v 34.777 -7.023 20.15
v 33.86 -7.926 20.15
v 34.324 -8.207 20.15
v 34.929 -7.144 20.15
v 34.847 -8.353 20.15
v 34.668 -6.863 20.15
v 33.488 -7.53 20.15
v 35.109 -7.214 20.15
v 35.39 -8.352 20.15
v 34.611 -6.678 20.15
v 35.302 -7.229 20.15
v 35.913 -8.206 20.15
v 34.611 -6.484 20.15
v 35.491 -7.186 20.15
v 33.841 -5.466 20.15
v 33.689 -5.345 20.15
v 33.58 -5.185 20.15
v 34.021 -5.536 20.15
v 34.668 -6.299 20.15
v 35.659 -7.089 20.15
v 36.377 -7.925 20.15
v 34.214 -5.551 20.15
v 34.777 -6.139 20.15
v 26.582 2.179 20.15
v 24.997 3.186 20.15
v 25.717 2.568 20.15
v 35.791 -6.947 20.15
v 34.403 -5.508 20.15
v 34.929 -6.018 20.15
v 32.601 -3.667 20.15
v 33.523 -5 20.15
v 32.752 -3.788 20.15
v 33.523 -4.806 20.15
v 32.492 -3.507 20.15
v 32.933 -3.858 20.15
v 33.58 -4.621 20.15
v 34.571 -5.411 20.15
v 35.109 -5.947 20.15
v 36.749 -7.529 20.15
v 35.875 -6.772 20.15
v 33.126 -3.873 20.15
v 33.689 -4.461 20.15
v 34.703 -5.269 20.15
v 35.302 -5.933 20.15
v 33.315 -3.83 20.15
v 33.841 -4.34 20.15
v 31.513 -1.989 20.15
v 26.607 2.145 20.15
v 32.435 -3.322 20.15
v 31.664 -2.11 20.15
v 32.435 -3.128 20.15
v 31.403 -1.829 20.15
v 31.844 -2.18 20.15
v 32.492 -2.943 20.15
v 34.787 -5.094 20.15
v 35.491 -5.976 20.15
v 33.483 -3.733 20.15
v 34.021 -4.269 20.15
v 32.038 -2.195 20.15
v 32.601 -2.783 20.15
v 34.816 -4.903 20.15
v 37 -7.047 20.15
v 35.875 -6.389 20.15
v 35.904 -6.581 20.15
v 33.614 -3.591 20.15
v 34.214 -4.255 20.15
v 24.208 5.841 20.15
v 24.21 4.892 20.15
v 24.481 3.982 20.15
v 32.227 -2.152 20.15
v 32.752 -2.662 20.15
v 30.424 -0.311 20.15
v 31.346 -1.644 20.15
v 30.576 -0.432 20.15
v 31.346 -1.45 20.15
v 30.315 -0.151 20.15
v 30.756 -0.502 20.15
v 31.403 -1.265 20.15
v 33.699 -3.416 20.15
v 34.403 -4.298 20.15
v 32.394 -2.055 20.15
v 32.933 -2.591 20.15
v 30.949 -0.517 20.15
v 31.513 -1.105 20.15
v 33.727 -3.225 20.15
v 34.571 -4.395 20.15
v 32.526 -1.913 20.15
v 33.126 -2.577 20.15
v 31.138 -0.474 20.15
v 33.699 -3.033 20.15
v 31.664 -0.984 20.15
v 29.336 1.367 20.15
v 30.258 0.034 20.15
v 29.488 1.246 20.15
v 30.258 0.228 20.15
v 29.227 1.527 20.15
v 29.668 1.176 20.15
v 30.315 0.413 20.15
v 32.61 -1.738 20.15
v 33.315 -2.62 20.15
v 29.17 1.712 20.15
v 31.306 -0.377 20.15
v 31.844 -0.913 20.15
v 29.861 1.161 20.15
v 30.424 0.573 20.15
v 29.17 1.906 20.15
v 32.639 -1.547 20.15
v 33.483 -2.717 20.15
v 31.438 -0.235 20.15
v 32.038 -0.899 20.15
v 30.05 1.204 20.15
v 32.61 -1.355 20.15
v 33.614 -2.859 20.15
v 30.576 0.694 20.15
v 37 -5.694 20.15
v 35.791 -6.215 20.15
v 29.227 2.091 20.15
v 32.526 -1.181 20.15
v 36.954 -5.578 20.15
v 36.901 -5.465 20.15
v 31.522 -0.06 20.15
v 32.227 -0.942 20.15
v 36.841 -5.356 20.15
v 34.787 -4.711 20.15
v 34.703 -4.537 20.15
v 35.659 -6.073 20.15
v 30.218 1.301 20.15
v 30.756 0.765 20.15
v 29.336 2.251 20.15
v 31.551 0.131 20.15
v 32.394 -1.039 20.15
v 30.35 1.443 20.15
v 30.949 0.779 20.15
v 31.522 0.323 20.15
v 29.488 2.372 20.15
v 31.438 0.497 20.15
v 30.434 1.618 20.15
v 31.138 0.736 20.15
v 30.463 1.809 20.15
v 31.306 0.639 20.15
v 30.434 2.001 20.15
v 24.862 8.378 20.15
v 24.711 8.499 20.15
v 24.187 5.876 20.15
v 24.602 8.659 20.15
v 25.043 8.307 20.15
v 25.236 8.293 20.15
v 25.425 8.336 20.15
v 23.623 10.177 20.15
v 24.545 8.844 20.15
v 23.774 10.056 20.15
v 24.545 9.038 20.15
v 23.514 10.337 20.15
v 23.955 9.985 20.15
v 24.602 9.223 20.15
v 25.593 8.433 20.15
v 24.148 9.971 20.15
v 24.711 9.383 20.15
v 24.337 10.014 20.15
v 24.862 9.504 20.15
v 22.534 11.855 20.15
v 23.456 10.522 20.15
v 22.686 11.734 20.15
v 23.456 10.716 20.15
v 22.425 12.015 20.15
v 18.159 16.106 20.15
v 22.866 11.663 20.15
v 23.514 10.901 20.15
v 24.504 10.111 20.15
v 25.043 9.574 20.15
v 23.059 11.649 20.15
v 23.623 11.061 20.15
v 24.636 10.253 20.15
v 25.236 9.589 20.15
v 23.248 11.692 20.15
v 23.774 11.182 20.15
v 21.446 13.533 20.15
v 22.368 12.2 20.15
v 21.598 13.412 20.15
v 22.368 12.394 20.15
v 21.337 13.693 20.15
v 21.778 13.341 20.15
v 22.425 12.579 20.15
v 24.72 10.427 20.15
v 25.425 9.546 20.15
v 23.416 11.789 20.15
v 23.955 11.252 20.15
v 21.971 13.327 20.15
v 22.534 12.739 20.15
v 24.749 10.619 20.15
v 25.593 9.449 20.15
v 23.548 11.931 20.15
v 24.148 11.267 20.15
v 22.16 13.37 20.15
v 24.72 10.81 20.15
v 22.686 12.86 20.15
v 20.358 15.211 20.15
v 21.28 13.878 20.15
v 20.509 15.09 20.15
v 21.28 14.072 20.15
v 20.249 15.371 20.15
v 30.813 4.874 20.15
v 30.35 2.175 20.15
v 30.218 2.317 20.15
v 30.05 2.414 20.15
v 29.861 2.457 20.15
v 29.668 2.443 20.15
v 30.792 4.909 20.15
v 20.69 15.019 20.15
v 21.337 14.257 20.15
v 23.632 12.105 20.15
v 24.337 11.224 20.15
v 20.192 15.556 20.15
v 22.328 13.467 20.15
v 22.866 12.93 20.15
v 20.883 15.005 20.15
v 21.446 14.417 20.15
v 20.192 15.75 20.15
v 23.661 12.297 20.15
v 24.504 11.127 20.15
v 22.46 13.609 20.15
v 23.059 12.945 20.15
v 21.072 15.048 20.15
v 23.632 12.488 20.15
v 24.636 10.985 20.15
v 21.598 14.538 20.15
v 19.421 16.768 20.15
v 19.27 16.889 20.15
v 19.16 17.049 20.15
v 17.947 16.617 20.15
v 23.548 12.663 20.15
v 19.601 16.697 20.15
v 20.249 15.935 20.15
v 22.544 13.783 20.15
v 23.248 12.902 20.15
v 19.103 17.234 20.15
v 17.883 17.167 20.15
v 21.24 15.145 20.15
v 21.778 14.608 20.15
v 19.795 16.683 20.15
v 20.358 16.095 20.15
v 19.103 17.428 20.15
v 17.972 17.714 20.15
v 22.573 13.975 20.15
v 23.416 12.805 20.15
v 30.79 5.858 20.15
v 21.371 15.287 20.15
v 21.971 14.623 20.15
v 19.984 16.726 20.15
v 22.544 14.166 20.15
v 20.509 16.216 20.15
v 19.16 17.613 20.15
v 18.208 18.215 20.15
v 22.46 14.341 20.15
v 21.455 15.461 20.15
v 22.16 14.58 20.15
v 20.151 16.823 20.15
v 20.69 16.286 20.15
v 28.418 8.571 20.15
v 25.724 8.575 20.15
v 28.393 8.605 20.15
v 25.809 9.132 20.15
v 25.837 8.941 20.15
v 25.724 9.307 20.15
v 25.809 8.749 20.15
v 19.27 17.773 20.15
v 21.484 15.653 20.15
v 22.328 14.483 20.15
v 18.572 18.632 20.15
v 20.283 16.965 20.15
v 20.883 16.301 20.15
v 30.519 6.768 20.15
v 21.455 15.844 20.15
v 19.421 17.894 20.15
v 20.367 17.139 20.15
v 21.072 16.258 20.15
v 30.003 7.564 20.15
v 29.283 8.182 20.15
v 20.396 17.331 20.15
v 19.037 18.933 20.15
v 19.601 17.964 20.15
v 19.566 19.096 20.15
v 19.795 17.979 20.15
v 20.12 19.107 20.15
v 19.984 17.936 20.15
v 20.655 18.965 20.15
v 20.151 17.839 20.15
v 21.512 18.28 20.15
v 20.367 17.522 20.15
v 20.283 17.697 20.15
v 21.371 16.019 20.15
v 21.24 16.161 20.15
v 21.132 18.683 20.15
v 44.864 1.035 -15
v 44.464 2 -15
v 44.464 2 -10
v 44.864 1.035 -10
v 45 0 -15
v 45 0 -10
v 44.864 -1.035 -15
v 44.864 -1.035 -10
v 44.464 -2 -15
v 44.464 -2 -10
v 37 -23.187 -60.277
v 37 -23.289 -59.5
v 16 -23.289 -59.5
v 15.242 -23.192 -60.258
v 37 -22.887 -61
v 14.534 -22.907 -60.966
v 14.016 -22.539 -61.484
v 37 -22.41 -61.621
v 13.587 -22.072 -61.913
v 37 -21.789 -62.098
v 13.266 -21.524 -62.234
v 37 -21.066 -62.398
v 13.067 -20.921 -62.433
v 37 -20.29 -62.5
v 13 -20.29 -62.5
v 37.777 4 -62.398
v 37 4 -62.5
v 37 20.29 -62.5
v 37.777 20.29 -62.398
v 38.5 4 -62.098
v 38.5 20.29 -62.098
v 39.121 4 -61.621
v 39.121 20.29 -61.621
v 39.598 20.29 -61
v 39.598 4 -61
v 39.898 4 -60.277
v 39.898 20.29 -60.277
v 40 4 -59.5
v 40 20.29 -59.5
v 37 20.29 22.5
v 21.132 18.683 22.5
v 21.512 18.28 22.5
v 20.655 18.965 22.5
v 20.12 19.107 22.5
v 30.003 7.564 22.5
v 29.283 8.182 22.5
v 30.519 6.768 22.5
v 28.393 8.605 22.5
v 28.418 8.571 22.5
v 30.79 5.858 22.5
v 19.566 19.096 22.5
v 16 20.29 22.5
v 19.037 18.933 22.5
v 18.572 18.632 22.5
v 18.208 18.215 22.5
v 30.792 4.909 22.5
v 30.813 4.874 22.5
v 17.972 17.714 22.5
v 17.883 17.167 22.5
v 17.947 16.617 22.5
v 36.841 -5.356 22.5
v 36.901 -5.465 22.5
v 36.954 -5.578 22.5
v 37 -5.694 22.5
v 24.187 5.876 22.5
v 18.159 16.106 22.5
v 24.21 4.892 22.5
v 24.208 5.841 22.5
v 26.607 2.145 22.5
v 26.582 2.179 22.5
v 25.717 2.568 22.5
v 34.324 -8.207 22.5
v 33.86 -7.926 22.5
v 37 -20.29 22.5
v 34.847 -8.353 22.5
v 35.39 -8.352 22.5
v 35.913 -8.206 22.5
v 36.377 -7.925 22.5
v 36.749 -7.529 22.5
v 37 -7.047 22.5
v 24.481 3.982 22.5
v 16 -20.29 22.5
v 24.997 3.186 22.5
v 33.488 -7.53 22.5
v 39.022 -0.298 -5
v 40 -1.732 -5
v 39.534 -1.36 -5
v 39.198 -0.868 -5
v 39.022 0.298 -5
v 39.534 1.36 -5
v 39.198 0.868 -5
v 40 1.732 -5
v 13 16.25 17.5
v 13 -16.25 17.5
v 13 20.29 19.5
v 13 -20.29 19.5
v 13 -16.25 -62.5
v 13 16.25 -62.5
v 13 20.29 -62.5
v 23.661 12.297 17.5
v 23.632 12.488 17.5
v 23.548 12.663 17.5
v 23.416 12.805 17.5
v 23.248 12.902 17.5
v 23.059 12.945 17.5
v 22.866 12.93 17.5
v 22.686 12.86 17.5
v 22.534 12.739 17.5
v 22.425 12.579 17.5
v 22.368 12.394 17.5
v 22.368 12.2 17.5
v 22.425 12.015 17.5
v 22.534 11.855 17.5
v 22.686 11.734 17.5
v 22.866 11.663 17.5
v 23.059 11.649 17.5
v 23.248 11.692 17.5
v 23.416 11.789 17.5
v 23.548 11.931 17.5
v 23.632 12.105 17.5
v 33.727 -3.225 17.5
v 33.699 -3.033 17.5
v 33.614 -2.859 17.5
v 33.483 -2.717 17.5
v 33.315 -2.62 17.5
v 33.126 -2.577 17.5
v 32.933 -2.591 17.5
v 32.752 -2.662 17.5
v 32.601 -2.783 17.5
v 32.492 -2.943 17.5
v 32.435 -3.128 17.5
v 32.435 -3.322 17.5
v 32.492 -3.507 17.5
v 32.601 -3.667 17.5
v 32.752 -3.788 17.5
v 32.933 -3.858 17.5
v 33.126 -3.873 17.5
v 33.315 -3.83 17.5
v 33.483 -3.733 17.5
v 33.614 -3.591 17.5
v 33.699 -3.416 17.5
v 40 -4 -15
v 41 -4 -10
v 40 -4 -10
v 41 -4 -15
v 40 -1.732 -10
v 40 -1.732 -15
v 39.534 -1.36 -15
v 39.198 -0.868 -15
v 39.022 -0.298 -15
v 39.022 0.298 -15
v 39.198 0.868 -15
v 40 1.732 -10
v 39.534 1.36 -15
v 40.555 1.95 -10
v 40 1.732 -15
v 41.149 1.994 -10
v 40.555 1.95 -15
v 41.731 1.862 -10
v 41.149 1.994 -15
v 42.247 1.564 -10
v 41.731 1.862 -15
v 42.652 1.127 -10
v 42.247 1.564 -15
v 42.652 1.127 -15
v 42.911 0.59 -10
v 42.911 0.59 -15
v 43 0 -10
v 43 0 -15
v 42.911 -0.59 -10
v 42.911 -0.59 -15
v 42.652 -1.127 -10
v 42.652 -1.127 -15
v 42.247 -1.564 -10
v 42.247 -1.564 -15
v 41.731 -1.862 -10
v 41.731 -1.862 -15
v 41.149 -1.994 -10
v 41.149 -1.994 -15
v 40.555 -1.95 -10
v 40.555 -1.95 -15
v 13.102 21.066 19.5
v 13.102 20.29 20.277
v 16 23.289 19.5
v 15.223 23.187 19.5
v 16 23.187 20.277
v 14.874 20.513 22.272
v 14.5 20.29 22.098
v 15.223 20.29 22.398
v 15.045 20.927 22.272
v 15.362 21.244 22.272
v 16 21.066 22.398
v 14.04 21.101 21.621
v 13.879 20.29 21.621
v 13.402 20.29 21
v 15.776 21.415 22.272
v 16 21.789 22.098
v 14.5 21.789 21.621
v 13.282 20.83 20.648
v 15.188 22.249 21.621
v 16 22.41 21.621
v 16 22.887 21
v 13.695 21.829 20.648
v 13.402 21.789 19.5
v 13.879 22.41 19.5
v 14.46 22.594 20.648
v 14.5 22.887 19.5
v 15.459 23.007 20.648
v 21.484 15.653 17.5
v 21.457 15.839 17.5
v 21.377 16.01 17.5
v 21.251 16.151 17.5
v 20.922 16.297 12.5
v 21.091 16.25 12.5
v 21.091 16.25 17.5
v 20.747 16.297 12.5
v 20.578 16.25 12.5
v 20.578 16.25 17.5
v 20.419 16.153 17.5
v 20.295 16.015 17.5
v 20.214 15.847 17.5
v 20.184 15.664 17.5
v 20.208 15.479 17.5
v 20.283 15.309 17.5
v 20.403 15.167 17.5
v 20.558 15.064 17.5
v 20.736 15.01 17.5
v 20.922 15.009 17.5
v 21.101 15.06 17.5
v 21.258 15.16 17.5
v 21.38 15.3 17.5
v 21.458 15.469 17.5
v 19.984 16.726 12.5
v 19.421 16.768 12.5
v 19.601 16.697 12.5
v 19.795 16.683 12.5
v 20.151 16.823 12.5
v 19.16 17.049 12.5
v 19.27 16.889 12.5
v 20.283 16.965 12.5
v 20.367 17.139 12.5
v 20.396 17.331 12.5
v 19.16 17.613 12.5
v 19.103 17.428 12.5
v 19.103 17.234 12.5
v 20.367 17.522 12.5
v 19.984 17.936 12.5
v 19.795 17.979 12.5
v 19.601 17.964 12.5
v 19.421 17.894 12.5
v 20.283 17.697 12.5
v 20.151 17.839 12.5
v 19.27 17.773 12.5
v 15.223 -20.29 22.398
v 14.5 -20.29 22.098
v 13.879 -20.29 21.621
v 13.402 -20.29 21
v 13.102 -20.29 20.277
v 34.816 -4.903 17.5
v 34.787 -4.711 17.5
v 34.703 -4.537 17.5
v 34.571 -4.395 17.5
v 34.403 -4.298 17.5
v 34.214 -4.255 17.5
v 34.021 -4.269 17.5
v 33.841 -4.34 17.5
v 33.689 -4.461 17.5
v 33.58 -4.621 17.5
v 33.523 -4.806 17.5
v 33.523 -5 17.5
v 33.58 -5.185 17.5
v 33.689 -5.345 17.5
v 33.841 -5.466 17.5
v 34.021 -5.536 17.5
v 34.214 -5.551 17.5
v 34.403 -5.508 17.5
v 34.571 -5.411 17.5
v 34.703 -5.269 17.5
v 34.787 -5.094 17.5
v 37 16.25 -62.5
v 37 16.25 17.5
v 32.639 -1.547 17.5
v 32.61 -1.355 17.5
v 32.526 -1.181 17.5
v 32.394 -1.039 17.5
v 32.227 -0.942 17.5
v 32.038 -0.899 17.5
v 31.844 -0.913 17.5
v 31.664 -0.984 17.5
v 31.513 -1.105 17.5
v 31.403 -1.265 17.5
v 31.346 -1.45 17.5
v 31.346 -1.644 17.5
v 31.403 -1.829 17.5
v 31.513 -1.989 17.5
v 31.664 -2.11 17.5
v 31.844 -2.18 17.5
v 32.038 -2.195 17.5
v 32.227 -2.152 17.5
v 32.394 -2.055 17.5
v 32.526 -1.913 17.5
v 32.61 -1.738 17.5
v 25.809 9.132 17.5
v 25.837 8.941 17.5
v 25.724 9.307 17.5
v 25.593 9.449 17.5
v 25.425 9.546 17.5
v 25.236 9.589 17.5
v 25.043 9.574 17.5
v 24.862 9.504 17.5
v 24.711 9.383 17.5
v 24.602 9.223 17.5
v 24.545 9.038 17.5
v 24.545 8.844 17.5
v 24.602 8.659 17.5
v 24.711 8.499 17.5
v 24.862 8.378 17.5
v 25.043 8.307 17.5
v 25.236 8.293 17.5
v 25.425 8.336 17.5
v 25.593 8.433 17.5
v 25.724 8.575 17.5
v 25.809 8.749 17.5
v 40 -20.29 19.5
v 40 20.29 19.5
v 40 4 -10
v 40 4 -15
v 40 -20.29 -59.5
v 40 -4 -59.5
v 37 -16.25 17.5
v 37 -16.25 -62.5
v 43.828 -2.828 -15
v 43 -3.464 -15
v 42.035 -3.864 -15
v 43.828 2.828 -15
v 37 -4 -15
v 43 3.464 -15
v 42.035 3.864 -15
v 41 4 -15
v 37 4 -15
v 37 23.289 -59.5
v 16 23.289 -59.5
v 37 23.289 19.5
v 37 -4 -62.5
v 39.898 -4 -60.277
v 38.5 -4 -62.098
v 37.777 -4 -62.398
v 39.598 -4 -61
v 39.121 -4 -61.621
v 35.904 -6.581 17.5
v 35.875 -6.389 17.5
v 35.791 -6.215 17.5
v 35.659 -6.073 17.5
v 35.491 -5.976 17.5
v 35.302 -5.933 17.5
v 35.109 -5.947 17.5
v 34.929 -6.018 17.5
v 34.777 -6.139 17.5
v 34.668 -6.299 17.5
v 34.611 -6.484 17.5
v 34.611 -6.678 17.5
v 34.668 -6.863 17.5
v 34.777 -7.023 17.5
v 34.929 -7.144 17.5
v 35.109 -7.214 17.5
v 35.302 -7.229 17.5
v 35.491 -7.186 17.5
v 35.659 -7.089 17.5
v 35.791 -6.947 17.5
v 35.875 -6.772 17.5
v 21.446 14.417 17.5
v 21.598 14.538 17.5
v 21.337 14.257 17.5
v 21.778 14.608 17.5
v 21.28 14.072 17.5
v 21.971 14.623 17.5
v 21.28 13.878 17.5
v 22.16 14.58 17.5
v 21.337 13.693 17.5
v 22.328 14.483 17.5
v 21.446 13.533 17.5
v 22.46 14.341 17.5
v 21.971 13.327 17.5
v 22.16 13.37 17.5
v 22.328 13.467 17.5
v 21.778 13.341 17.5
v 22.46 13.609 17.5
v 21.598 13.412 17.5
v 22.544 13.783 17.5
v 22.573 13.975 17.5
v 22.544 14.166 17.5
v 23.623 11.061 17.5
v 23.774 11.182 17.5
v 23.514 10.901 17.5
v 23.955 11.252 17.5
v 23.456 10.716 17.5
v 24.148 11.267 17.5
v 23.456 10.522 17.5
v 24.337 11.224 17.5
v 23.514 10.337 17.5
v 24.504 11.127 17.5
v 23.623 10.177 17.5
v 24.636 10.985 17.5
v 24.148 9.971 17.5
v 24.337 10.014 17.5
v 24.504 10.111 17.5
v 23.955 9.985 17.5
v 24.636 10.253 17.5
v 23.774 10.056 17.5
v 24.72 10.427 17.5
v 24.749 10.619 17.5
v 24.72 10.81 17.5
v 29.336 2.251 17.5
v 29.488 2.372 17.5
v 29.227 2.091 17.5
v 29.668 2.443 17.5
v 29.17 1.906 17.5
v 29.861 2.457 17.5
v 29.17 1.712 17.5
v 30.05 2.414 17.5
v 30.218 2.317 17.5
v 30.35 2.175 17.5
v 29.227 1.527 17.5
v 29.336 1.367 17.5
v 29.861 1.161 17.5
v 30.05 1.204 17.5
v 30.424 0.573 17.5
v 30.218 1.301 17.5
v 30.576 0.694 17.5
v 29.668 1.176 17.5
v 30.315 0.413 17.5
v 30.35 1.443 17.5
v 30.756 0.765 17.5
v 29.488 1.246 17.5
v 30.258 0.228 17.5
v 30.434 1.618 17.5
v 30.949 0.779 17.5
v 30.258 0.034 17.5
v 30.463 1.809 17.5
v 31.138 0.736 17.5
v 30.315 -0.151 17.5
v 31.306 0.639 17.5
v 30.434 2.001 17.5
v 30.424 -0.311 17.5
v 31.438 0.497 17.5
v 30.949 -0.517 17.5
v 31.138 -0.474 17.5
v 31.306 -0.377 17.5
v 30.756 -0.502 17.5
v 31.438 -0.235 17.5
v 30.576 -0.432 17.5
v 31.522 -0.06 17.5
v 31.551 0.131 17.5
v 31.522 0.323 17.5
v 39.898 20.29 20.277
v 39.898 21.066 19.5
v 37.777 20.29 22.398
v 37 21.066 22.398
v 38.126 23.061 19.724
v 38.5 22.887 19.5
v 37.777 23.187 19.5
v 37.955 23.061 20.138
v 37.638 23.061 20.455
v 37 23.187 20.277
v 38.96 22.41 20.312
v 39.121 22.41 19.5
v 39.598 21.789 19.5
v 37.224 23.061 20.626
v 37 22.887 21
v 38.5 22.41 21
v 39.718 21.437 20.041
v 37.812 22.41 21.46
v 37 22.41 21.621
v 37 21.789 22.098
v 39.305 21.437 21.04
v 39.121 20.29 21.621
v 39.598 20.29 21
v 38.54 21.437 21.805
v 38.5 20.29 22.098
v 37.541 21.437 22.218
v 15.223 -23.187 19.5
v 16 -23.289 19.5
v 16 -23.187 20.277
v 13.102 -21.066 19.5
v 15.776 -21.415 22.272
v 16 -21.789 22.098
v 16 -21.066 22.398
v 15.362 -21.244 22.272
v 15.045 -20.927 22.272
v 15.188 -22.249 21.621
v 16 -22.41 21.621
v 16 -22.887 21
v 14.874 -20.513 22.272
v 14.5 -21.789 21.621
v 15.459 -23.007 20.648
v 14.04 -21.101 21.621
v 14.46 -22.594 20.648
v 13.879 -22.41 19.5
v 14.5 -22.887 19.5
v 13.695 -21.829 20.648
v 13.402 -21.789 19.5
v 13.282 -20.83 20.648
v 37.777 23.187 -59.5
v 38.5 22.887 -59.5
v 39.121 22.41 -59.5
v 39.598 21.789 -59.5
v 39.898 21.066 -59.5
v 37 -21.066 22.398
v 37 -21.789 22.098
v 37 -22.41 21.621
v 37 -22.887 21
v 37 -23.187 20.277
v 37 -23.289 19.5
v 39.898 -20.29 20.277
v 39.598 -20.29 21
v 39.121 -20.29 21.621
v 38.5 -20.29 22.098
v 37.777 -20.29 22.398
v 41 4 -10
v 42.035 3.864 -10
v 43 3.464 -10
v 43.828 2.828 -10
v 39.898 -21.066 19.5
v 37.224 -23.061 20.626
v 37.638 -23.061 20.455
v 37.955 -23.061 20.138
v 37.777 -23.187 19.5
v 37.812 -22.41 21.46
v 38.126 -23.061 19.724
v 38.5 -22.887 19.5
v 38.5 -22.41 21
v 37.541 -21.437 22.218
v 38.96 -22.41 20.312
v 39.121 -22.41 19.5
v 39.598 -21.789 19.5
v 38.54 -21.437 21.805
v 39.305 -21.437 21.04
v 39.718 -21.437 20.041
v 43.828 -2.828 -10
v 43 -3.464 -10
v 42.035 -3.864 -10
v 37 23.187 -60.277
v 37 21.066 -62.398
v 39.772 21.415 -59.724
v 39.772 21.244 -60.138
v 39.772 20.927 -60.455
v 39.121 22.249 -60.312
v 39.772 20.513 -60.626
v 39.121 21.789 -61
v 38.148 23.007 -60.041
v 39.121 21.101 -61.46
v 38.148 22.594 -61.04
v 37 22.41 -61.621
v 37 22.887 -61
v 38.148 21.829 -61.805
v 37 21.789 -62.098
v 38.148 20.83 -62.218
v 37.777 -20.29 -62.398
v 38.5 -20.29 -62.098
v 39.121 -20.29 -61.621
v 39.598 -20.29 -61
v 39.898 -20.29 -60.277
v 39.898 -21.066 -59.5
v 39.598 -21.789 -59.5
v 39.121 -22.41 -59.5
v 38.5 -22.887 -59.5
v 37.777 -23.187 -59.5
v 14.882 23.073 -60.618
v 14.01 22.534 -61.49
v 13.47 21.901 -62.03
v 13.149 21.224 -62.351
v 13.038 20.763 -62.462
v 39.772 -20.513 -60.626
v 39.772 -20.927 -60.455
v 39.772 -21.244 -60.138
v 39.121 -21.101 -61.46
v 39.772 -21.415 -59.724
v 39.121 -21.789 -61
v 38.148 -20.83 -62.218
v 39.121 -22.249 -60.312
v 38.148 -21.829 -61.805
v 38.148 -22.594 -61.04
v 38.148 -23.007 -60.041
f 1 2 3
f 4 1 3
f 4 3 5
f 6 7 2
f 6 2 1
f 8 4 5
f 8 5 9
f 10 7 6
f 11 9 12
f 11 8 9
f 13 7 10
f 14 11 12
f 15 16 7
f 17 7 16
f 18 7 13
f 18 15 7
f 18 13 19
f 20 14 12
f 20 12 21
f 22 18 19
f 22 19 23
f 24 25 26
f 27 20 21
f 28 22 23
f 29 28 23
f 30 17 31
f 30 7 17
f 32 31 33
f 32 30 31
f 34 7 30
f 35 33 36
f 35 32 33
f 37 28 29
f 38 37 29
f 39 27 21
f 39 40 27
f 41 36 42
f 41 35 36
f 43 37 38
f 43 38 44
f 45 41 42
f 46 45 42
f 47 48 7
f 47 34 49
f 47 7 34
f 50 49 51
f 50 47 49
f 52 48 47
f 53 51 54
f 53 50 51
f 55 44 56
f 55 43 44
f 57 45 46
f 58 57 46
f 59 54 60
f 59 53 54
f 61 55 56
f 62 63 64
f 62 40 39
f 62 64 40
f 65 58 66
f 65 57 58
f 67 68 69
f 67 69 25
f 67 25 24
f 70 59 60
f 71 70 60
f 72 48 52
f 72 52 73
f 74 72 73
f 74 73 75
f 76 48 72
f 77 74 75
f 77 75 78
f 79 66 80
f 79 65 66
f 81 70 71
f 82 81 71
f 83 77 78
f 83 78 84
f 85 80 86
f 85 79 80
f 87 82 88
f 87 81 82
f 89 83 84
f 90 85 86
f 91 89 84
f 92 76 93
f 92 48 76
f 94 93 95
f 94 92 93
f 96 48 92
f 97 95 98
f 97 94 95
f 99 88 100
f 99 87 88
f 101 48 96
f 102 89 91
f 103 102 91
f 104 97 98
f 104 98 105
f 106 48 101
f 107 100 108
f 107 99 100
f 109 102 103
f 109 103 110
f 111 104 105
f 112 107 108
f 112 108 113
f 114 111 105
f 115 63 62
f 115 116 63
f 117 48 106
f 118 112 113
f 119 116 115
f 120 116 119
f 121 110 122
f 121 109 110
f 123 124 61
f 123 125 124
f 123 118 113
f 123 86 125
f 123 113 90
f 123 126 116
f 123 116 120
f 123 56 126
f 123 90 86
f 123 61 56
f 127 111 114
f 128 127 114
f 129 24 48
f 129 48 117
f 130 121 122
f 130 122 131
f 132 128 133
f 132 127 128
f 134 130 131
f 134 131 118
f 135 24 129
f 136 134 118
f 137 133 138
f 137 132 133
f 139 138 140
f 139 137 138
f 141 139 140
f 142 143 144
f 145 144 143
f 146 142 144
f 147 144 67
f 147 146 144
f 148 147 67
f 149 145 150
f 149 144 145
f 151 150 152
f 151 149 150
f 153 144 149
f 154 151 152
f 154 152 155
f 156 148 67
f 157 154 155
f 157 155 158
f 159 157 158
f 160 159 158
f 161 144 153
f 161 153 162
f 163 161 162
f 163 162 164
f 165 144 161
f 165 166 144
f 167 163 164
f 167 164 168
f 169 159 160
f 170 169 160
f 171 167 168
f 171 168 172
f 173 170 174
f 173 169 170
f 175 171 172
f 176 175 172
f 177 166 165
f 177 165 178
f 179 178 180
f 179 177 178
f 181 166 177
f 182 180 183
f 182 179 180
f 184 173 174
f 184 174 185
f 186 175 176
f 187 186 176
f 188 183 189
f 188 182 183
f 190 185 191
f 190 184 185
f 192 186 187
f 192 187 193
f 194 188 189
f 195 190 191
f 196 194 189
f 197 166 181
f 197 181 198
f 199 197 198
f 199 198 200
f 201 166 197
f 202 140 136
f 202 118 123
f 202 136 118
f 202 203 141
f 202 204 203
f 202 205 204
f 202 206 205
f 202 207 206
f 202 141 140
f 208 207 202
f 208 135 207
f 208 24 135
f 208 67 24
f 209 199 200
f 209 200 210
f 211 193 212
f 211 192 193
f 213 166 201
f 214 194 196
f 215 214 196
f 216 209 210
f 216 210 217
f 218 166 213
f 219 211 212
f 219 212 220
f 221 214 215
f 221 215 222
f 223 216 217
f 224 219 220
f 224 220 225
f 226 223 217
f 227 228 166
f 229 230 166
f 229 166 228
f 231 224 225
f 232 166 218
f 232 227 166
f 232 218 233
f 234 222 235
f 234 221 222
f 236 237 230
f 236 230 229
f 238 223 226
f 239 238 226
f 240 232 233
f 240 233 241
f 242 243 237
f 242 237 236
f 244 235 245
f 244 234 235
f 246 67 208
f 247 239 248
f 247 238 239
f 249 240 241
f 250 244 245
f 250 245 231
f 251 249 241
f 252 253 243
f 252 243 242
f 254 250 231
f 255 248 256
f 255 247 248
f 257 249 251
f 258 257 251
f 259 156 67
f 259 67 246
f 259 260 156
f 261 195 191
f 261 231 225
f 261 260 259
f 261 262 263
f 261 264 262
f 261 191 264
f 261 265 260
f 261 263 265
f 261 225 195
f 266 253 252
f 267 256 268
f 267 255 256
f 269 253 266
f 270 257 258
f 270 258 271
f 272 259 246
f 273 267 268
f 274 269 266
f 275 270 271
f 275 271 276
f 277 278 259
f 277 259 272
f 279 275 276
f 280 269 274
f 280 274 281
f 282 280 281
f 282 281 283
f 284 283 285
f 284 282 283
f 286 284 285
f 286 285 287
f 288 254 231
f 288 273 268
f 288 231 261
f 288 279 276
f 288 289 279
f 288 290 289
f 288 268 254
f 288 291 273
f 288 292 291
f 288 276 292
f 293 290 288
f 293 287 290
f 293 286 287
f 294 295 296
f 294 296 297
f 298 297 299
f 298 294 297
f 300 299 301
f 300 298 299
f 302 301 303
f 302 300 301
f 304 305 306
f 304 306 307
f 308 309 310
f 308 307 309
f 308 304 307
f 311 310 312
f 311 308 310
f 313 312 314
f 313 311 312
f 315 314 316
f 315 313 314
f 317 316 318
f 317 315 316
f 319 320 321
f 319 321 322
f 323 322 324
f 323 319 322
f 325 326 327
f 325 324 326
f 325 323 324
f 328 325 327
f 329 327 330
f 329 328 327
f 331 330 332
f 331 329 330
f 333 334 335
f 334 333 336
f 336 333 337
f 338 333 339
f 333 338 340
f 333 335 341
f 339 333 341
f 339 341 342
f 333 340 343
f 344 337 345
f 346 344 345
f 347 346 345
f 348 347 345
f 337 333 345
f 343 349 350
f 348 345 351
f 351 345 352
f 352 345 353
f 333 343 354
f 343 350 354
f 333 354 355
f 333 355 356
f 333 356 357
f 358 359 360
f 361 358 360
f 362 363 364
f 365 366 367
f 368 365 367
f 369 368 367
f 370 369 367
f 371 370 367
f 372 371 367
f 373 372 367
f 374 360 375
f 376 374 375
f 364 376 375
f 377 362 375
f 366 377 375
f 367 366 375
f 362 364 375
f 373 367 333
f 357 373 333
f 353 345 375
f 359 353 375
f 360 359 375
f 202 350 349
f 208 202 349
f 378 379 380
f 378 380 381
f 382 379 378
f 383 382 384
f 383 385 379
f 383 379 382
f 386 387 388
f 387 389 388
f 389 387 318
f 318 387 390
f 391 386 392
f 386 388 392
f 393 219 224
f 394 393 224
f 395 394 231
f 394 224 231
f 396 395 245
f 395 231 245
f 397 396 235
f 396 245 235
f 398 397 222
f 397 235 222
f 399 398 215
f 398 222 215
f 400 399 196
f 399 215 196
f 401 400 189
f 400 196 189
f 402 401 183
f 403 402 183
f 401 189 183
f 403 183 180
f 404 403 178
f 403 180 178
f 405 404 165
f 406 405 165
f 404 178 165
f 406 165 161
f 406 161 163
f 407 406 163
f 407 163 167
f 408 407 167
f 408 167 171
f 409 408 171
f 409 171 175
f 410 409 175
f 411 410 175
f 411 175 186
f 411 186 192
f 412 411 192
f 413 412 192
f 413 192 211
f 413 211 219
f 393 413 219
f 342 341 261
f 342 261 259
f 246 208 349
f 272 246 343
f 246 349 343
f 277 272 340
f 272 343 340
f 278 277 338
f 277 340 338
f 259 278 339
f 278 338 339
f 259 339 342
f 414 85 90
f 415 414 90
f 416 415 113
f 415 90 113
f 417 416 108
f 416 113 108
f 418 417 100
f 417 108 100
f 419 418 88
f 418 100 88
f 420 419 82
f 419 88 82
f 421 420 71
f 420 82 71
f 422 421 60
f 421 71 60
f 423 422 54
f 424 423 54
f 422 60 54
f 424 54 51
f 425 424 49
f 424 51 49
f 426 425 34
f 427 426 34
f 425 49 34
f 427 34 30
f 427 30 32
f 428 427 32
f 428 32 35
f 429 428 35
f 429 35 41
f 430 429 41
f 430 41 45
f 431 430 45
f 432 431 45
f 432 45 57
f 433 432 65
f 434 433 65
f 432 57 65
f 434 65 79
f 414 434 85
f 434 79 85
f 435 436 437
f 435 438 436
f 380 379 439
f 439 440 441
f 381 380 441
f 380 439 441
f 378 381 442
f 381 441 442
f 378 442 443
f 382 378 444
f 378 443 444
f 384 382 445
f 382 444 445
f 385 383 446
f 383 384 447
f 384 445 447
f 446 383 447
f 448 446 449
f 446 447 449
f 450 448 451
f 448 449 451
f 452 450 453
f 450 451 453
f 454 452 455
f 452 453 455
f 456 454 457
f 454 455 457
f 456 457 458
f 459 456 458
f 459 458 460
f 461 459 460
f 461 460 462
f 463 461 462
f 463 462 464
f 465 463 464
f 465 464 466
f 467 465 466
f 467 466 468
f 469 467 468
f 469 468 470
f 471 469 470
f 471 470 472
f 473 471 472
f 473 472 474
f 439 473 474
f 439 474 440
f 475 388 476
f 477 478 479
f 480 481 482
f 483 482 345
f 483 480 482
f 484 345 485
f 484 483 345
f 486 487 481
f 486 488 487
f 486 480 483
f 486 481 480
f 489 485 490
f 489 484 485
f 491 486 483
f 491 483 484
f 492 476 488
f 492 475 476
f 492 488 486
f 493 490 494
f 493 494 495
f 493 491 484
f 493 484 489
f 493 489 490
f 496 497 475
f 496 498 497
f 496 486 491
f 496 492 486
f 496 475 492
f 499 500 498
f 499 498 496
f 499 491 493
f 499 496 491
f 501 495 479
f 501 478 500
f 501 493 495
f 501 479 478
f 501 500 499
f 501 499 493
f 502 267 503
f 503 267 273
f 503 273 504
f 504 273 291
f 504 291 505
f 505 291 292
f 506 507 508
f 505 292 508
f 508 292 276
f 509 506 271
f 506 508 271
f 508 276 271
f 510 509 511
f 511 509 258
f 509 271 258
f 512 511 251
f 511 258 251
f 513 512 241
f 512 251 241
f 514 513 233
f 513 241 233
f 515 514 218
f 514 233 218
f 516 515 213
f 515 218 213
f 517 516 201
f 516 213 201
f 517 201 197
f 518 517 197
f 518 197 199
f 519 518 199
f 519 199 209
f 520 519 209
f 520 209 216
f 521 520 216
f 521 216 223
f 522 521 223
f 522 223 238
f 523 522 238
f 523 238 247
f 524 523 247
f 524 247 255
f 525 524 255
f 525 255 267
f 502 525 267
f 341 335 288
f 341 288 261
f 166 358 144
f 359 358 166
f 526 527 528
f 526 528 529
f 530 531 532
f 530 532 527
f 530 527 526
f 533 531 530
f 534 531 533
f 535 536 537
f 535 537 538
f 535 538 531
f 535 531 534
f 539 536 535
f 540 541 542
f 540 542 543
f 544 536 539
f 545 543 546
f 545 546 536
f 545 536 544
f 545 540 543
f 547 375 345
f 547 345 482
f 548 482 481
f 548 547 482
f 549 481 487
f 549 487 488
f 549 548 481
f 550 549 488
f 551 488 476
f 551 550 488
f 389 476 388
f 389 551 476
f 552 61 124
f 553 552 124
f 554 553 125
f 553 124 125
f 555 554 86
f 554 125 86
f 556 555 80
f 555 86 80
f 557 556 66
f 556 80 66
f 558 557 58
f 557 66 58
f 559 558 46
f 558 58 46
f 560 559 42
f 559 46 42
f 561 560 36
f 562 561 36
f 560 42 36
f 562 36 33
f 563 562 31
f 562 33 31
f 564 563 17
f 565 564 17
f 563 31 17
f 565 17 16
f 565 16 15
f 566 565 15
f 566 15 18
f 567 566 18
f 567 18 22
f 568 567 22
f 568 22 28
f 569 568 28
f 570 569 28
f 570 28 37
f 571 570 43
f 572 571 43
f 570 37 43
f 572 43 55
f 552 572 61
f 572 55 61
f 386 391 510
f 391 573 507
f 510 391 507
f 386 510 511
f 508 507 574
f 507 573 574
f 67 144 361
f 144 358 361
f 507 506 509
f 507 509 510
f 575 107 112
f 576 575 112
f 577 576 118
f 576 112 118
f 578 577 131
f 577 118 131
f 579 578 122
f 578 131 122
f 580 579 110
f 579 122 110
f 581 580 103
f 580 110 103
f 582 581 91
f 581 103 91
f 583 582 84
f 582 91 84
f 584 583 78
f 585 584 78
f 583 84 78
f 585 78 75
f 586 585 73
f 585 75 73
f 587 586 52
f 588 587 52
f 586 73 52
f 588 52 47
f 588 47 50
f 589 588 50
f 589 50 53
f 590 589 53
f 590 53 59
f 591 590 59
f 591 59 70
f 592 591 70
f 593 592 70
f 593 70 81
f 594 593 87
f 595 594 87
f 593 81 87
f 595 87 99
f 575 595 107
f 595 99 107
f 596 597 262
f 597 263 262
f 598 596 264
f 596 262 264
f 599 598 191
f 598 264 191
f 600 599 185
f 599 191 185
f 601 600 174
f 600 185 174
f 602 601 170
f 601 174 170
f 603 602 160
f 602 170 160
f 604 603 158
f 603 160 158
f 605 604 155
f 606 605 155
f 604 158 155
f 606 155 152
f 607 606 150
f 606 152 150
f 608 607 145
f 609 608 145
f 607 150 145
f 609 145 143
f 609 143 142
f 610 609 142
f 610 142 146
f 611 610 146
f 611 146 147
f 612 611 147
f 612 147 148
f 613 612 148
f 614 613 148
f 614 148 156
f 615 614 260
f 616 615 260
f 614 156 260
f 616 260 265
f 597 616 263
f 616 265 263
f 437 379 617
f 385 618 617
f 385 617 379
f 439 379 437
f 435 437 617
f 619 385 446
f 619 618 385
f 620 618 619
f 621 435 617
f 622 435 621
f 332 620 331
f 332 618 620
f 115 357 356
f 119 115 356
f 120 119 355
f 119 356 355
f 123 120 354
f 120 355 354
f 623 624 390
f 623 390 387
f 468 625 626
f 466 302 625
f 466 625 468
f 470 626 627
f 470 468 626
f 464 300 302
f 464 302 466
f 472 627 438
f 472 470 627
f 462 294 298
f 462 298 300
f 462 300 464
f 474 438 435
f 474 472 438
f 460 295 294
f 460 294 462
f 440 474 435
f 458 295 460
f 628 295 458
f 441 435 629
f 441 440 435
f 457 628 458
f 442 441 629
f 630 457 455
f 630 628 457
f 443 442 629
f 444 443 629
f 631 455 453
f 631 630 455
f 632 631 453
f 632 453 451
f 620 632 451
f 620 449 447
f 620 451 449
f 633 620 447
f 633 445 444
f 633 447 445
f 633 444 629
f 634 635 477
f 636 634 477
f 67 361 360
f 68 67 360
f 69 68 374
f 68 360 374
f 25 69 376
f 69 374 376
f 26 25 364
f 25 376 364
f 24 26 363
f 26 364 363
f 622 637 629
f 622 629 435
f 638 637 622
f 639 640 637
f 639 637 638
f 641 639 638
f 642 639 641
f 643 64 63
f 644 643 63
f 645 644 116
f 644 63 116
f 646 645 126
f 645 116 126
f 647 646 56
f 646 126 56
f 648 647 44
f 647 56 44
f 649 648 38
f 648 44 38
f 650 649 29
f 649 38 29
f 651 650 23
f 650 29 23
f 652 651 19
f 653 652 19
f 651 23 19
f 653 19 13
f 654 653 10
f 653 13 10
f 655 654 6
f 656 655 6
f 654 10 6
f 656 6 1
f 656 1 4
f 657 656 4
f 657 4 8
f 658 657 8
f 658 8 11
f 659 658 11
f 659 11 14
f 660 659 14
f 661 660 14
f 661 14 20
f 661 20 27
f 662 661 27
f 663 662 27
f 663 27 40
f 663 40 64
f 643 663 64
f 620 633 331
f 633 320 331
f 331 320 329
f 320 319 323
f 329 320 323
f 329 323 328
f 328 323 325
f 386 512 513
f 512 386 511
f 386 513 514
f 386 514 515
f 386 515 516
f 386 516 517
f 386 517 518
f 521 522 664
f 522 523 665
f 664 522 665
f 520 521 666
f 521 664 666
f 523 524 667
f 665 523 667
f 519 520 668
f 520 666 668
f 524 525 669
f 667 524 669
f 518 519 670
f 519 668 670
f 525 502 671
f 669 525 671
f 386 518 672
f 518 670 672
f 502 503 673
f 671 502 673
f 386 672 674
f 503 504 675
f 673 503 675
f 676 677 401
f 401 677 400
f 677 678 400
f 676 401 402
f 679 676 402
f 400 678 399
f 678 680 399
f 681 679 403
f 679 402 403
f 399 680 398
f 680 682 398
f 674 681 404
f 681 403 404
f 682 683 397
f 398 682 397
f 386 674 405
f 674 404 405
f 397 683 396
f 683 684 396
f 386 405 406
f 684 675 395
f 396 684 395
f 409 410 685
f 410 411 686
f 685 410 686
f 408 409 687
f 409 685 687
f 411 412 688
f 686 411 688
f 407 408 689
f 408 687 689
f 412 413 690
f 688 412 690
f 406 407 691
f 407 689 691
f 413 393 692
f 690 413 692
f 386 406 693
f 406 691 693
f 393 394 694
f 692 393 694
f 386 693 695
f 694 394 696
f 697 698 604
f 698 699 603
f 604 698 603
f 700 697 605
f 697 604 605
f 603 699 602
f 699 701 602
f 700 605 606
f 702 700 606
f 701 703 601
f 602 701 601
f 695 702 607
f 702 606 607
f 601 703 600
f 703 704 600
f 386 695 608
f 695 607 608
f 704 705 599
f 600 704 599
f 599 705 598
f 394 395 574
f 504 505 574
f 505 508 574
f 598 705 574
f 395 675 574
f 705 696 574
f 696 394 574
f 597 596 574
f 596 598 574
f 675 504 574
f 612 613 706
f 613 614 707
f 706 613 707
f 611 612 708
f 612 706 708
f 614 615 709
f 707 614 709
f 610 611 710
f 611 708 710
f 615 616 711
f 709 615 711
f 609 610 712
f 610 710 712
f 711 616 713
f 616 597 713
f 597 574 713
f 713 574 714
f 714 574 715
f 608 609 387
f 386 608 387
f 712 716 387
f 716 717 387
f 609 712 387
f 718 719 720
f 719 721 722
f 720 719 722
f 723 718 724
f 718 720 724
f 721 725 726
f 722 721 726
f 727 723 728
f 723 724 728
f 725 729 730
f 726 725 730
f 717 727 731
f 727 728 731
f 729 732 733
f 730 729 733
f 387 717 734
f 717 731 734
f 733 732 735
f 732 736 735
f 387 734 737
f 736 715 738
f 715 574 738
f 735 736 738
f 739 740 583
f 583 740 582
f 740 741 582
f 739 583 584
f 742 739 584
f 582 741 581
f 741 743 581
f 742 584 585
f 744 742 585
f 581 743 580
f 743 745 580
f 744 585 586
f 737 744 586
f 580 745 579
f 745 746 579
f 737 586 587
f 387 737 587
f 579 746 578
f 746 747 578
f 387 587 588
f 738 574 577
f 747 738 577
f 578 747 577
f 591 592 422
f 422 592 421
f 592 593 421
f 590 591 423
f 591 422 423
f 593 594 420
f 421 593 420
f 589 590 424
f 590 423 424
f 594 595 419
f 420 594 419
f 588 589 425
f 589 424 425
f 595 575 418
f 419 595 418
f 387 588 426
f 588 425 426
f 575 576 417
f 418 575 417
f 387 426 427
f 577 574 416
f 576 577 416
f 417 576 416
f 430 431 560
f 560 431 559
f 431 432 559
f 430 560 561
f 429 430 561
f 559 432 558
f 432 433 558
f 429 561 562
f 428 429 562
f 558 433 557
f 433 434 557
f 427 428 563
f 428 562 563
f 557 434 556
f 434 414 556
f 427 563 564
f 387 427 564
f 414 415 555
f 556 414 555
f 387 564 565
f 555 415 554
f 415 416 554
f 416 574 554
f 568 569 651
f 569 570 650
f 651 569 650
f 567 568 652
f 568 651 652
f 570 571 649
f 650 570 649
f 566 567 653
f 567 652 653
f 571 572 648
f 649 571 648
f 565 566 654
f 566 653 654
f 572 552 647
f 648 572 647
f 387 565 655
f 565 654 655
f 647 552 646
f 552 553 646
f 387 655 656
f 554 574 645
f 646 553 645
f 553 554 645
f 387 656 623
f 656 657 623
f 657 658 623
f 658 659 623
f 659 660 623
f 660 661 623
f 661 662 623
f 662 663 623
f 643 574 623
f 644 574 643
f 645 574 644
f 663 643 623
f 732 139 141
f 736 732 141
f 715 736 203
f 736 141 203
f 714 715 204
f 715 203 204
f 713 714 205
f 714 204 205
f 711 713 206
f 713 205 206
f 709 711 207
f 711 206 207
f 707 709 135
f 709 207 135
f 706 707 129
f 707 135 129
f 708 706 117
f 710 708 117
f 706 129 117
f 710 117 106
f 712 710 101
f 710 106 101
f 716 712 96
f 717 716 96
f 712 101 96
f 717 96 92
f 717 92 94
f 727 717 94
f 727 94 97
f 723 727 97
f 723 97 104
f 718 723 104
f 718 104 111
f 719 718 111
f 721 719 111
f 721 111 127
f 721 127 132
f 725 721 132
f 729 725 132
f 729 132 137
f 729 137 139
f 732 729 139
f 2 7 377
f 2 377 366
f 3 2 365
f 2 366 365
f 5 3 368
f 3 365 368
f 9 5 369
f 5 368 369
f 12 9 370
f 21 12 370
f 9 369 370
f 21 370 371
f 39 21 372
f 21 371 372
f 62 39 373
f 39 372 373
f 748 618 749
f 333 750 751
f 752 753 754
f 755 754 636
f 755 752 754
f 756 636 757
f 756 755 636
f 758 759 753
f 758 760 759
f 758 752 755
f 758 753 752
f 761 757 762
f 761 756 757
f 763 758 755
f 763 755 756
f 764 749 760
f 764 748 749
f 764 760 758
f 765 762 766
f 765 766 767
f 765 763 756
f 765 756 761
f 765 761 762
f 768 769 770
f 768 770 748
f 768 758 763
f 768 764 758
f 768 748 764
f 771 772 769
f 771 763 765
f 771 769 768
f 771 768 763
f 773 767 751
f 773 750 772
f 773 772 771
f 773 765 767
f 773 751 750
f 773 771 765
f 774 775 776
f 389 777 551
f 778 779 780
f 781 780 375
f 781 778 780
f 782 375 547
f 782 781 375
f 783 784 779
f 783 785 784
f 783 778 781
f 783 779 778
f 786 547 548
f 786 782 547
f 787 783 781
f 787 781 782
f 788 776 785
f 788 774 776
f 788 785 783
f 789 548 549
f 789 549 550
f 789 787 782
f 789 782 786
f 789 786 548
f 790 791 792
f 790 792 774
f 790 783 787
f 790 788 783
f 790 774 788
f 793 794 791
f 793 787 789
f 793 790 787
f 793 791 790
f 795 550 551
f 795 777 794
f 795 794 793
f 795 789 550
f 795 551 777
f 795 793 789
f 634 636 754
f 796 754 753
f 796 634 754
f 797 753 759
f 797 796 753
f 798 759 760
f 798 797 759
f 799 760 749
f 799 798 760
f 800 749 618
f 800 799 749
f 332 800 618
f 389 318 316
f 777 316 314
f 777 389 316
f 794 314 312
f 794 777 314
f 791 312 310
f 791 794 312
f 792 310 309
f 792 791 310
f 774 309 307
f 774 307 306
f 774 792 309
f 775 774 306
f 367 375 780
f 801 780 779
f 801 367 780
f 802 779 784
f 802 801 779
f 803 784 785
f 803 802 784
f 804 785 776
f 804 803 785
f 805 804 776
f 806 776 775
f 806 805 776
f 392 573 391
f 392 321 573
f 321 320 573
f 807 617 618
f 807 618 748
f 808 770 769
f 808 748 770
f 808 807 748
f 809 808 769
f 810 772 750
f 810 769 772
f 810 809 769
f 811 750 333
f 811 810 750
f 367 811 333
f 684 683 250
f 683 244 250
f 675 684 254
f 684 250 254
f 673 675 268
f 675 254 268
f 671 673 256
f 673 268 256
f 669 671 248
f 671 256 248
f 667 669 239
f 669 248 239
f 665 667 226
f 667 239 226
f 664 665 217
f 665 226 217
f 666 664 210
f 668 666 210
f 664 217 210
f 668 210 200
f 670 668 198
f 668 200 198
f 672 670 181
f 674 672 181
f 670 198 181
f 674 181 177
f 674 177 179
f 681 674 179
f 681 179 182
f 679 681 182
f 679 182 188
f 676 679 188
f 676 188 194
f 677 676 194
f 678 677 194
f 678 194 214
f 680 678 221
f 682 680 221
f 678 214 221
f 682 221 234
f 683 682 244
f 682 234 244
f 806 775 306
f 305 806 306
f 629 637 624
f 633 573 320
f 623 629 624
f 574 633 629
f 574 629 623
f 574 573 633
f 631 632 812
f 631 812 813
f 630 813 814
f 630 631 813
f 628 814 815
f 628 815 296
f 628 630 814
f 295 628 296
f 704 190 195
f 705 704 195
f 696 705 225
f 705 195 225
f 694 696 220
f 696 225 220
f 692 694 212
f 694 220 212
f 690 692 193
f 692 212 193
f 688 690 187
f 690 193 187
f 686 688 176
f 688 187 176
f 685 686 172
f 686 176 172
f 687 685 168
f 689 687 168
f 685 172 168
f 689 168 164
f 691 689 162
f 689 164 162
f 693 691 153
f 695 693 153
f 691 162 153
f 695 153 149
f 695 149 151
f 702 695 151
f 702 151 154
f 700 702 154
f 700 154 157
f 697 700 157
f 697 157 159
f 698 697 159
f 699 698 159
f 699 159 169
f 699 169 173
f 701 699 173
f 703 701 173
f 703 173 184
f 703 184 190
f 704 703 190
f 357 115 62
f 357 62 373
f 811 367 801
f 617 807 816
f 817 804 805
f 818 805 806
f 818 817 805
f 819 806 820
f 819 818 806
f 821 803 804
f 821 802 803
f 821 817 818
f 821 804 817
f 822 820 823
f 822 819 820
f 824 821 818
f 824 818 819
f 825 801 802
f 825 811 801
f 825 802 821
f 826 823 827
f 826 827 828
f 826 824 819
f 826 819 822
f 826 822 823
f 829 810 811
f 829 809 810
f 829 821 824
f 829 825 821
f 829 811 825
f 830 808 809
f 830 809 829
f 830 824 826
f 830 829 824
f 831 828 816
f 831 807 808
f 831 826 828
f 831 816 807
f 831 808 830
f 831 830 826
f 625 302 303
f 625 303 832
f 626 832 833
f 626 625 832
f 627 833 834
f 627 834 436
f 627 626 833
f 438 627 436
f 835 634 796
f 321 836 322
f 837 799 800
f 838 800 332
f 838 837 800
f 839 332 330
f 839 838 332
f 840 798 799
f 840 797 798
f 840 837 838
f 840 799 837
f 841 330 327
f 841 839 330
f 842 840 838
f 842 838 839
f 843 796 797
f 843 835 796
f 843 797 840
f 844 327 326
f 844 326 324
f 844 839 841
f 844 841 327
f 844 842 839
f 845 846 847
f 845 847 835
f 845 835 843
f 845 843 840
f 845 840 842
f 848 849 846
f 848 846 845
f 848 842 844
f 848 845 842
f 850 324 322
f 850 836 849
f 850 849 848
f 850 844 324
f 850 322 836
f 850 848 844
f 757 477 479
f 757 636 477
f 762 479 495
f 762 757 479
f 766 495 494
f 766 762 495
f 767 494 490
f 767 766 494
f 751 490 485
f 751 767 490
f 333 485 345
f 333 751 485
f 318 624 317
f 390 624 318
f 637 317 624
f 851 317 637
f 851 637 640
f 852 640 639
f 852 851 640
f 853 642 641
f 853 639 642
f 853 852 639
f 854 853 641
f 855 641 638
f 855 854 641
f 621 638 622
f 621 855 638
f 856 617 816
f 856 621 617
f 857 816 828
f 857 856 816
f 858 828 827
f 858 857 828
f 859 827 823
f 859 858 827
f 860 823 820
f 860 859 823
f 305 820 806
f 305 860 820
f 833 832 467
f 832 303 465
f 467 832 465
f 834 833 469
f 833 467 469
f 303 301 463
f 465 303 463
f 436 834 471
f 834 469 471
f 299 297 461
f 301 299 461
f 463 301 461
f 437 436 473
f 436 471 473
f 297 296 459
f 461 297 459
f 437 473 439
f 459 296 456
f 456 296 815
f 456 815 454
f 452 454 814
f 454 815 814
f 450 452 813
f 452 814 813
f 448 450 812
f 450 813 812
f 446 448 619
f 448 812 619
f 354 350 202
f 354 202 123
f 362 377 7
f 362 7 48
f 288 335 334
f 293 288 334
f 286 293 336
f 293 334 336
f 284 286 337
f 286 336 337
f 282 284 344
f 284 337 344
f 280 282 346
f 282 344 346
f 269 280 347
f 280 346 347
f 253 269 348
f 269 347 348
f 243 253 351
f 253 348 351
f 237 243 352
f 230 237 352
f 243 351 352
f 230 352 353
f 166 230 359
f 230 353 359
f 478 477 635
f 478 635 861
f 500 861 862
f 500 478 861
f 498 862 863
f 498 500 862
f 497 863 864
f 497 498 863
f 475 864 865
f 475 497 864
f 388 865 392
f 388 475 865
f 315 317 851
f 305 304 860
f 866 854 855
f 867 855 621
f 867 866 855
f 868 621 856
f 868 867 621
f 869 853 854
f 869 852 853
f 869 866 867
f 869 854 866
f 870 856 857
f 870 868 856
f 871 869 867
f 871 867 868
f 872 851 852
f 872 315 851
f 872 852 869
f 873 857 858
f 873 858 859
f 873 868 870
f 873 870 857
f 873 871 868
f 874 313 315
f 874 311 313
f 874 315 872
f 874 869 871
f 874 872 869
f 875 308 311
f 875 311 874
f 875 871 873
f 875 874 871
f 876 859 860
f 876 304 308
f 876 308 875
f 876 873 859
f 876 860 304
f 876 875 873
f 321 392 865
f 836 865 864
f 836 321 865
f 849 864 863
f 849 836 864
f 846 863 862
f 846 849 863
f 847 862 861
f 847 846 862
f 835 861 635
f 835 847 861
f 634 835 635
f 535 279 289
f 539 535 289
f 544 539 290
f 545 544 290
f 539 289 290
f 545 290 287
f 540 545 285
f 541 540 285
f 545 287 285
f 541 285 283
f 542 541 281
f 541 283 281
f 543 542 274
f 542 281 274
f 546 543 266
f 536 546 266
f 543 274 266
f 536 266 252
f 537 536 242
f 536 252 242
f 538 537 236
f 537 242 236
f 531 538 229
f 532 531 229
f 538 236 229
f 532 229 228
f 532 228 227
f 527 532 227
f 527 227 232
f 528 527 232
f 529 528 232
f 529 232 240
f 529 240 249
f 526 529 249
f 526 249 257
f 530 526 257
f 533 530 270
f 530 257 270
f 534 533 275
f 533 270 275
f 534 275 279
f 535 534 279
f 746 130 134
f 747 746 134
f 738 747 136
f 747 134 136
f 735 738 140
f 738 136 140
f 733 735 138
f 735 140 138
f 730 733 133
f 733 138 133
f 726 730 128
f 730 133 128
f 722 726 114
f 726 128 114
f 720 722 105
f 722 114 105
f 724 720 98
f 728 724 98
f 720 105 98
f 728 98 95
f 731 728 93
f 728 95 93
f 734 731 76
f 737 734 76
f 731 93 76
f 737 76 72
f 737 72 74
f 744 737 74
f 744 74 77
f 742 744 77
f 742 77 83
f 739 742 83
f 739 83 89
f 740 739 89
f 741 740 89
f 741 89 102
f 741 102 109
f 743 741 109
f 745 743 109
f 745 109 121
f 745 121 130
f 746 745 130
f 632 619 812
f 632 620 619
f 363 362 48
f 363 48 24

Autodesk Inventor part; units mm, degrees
ref_plane "YZ Plane" through (0, 0, 0) normal (1, 0, 0) x (0, 1, 0)
ref_plane "XZ Plane" through (0, 0, 0) normal (0, 1, 0) x (-1, 0, 0)
sketch "Sketch1" plane through (0, 0, 0) normal (1, 0, 0) x (0, 1, 0)
  line L0 (23.289, 22.5) -> (-23.289, 22.5)
  line L1 (-23.289, 22.5) -> (-23.289, -22.5)
  line L2 (-23.289, -22.5) -> (23.289, -22.5)
  line L3 (23.289, -22.5) -> (23.289, 22.5)
  line L4 (23.289, 22.5) -> (-23.289, -22.5) construction
  line L5 (-23.289, 22.5) -> (23.289, -22.5) construction
  point P0 (0, 0)
  dimension "d0" = 45
  dimension "d1" = 46.578
extrude "Extrusion1" add sketch "Sketch1" along normal blind 50
fillet "Fillet1" radius 0.01 2 edges at (50, 0, 22.5) (0, 0, 22.5)
sketch "Sketch2" plane through (0.01, -23.289, 22.5) normal (0, 0, 1) x (1, 0, 0)
  arc A0 (21.5019, 41.5691) -> (18.149, 39.3946) centre (19.8721, 40.41) ccw projected
  line L0 (24.1767, 29.1655) -> (18.149, 39.3946) projected
  circle A1 centre (19.7361, 40.6197) radius 0.65 projected
  circle A2 centre (20.8243, 38.9417) radius 0.65 projected
  line L1 (21.5019, 41.5691) -> (28.3834, 31.8938) projected
  circle A3 centre (21.9126, 37.2637) radius 0.65 projected
  circle A4 centre (23.0009, 35.5857) radius 0.65 projected
  circle A5 centre (24.0892, 33.9077) radius 0.65 projected
  circle A6 centre (25.1774, 32.2297) radius 0.65 projected
  circle A7 centre (29.8026, 25.0983) radius 0.65 projected
  circle A8 centre (27.49, 28.664) radius 3.325 projected
  line L2 (33.4781, 15.7589) -> (26.5966, 25.4342) projected
  arc A9 (33.4781, 15.7589) -> (36.831, 17.9334) centre (35.1079, 16.918) ccw projected
  line L3 (30.8033, 28.1625) -> (36.831, 17.9334) projected
  circle A10 centre (30.8908, 23.4203) radius 0.65 projected
  circle A11 centre (31.9791, 21.7423) radius 0.65 projected
  circle A12 centre (33.0674, 20.0643) radius 0.65 projected
  circle A13 centre (34.1557, 18.3863) radius 0.65 projected
  circle A14 centre (35.2439, 16.7083) radius 0.65 projected
  line L4 (24.1767, 29.1655) -> (24.1978, 29.1297)
  line L5 (30.8033, 28.1625) -> (30.7822, 28.1983)
  line L6 (26.5966, 25.4342) -> (26.5725, 25.4681)
  line L7 (28.3834, 31.8938) -> (28.4075, 31.8599)
  point P0 (-0.01, 23.289)
extrude "Extrusion2" cut sketch "Sketch2" against normal blind 2.35 contours L1 L7 A8 L4 L0 A0 | A8 | A8 L5 L3 A9 L2 L6 | A1 | A2 | A3 | A4 | A5 | A6 | A7 | A10 | A11 | A12 | A13 | A14
sketch "Sketch3" plane through (0.01, -23.289, 22.5) normal (0, 0, 1) x (1, 0, 0)
  circle A0 centre (20.8243, 38.9417) radius 0.65 projected
  circle A1 centre (19.7361, 40.6197) radius 0.65 projected
  circle A2 centre (21.9126, 37.2637) radius 0.65 projected
  circle A3 centre (23.0009, 35.5857) radius 0.65 projected
  circle A4 centre (24.0892, 33.9077) radius 0.65 projected
  circle A5 centre (25.1774, 32.2297) radius 0.65 projected
  circle A6 centre (29.8026, 25.0983) radius 0.65 projected
  circle A7 centre (30.8908, 23.4203) radius 0.65 projected
  circle A8 centre (31.9791, 21.7423) radius 0.65 projected
  circle A9 centre (33.0674, 20.0643) radius 0.65 projected
  circle A10 centre (34.1557, 18.3863) radius 0.65 projected
  circle A11 centre (35.2439, 16.7083) radius 0.65 projected
  point P0 (-0.01, 23.289)
extrude "Extrusion3" cut sketch "Sketch3" against normal blind 10
sketch "Sketch4" plane through (50, 0, 0) normal (1, 0, 0) x (0, 0, -1)
  line L0 (30, 4) -> (30, -4) projected
  line L1 (30, -4) -> (15, -4) projected
  line L2 (15, -4) -> (15, 4) projected
  line L3 (15, 4) -> (30, 4) projected
  line L4 (62.5, 16.25) -> (-17.5, 16.25) projected
  line L5 (62.5, -16.25) -> (-17.5, -16.25) projected
  line L6 (-17.5, 16.25) -> (-17.5, -16.25) projected
  line L7 (62.5, 16.25) -> (62.5, -16.25) projected
  point P0 (0, 0)
extrude "Extrusion4" cut sketch "Sketch4" against normal through all contours L0 L1 L2 L3 | L7 L5 L6 L4
sketch "Sketch5" plane through (0, 23.289, -22.5) normal (0, 1, 0) x (1, 0, 0)
  line L0 (0, 0) -> (50, 0) projected
  line L1 (50, 0) -> (45, 0)
  line L2 (45, 0) -> (45, -48.3734)
  line L3 (45, -48.3734) -> (50, -48.3734)
  line L4 (50, -48.3734) -> (50, 0)
  point P0 (0, -22.5)
  point P1 (45, 0)
  dimension "d11" = 5
extrude "Extrusion5" cut sketch "Sketch5" against normal through all
sketch "Sketch6" plane through (0, 23.289, 22.49) normal (0, 1, 0) x (1, 0, 0)
  line L0 (45, 4.99) -> (45, 44.99) projected
  line L1 (45, 44.99) -> (37, 44.99)
  line L2 (37, 44.99) -> (37, -0.01)
  line L3 (37, -0.01) -> (45, -0.01)
  line L4 (45, -0.01) -> (45, 44.99)
  line L5 (0.01, -0.01) -> (45, -0.01) projected
  point P0 (0, 22.49)
  point P1 (45, 9.99)
  point P2 (41, -0.01)
  point P3 (45, 9.99)
  dimension "d14" = 0
  dimension "d15" = 8
extrude "Extrusion6" add sketch "Sketch6" against normal up to surface (39.539 mm away)
sketch "Sketch7" plane through (0, -23.289, -22.5) normal (0, 0, -1) x (-1, 0, 0)
  line L0 (-41, 21.289) -> (-44.4641, 21.289) projected
  arc A0 (-44.4641, 21.289) -> (-41, 19.289) centre (-41, 23.289) ccw projected
  line L1 (-41, 19.289) -> (-37, 19.289) projected
  line L2 (-37, 27.289) -> (-37, 19.289) projected
  line L3 (-37, 27.289) -> (-41, 27.289) projected
  arc A1 (-41, 27.289) -> (-44.4641, 25.289) centre (-41, 23.289) ccw projected
  line L4 (-44.4641, 25.289) -> (-41, 25.289) projected
  arc A2 (-41, 21.289) -> (-41, 25.289) centre (-41, 23.289) ccw projected
  arc A3 (-44.4641, 25.289) -> (-44.4641, 21.289) centre (-41, 23.289) ccw projected
  arc A4 (-41, 25.289) -> (-41, 21.289) centre (-41, 23.289) ccw projected
  arc A5 (-41, 25.289) -> (-41, 21.289) centre (-41, 23.289) ccw projected
  line L5 (-44.4641, 25.289) -> (-41, 25.289) projected
  arc A6 (-44.4641, 25.289) -> (-44.4641, 21.289) centre (-41, 23.289) ccw projected
  line L6 (-41, 21.289) -> (-44.4641, 21.289) projected
  point P0 (0, 23.289)
sketch "Sketch8" plane through (0, 23.289, 22.49) normal (0, 1, 0) x (1, 0, 0)
  line L0 (0.01, -0.01) -> (45, -0.01) projected
  line L1 (45, -0.01) -> (40, -0.01)
  line L2 (40, -0.01) -> (40, 55.178)
  line L3 (40, 55.178) -> (45, 55.178)
  line L4 (45, 55.178) -> (45, -0.01)
  point P0 (0, 22.49)
  point P1 (40, -0.01)
  dimension "d18" = 5
extrude "Extrusion7" cut sketch "Sketch8" against normal through all
extrude "Extrusion8" cut sketch "Sketch7" against normal blind 7.5
ref_plane "Work Plane1" through (0, 16.25, -15) normal (0, 0, -1) x (-1, 0, 0)
sketch "Sketch9" plane through (0, 16.25, -15) normal (0, 0, -1) x (-1, 0, 0)
  arc A0 (-41, -12.25) -> (-44.4641, -14.25) centre (-41, -16.25) ccw projected
  line L0 (-37, -12.25) -> (-41, -12.25) projected
  line L1 (-37, -12.25) -> (-37, -20.25) projected
  arc A1 (-41, -18.25) -> (-41, -14.25) centre (-41, -16.25) ccw projected
  arc A2 (-41, -14.25) -> (-41, -18.25) centre (-41, -16.25) ccw projected
  line L2 (-41, -18.25) -> (-44.4641, -18.25) projected
  line L3 (-44.4641, -14.25) -> (-41, -14.25) projected
  arc A3 (-44.4641, -14.25) -> (-44.4641, -18.25) centre (-41, -16.25) ccw projected
  arc A4 (-44.4641, -18.25) -> (-41, -20.25) centre (-41, -16.25) ccw projected
  line L4 (-37, -20.25) -> (-40, -20.25) projected
  line L5 (-41, -20.25) -> (-37, -20.25) projected
  line L6 (-40, -12.25) -> (-40, -20.25)
  line L7 (-40, -39.539) -> (-40, 7.039) projected
  line L8 (-39, -12.25) -> (-39, -20.25)
  point P0 (0, -16.25)
  point P1 (-39, -20.25)
  point P2 (-39, -16.25)
extrude "Extrusion9" cut sketch "Sketch9" against normal blind 5 contours L0 L6 A1 L3 A0 | L3 A2 L2 A3 | L0 L8 A1 L6 | A1 L6 A2 | L2 A1 L6 L5 A4 | A1 L6 | L8 L4 L6 A1
extrude "Extrusion10" add sketch "Sketch9" against normal blind 5 contours L0 L6 A1 L3 A0 | L3 A2 L2 A3 | L0 L8 A1 L6 | L2 A1 L6 L5 A4 | L8 L4 L6 A1
extrude "Extrusion11" cut sketch "Sketch9" against normal blind 10 contours A1 L6 A2 | A1 L6
sketch "Sketch10" plane through (0, 23.289, 22.49) normal (0, 1, 0) x (1, 0, 0)
  line L0 (0, -0.01) -> (13, -0.01)
  line L1 (13, -0.01) -> (13, 49.0312)
  line L2 (13, 49.0312) -> (0, 49.0312)
  line L3 (0, 49.0312) -> (0, -0.01)
  line L4 (0, 44.99) -> (0, 0) projected
  line L5 (0.01, -0.01) -> (40, -0.01) projected
  point P0 (0, 22.49)
  dimension "d30" = 0
  dimension "d31" = 13
  dimension "d32" = 0
extrude "Extrusion12" cut sketch "Sketch10" against normal through all
sketch "Sketch11" plane through (40, 4, -22.5) normal (0, 0, -1) x (-1, 0, 0)
  line L0 (27, 12.25) -> (27, 19.289) projected
  line L1 (27, 19.289) -> (0, 19.289) projected
  line L2 (0, 19.289) -> (0, 0) projected
  line L3 (0, 0) -> (3, 0) projected
  line L4 (3, 12.25) -> (3, 0) projected
  line L5 (3, 12.25) -> (27, 12.25) projected
  line L6 (27, -27.289) -> (27, -20.25) projected
  line L7 (27, -20.25) -> (3, -20.25) projected
  line L8 (3, -8) -> (3, -20.25) projected
  line L9 (3, -8) -> (0, -8) projected
  line L10 (0, -8) -> (0, -27.289) projected
  line L11 (27, -27.289) -> (0, -27.289) projected
  point P0 (40, -4)
extrude "Extrusion13" add sketch "Sketch11" along normal blind 40
fillet "Fillet2" radius 3 12 edges at (26.5, 23.289, -62.5) (40, 13.6445, -62.5) (13, 23.289, -20) (13, -23.289, -20) (26.5, -23.289, -62.5) (40, -13.6445, -62.5) (13, 0, 22.5) (40, 0, 22.5) (26.5, -23.289, 22.5) (26.5, 23.289, 22.5) (40, 23.289, -20) (40, -23.289, -20)
properties part number "New End effector"
